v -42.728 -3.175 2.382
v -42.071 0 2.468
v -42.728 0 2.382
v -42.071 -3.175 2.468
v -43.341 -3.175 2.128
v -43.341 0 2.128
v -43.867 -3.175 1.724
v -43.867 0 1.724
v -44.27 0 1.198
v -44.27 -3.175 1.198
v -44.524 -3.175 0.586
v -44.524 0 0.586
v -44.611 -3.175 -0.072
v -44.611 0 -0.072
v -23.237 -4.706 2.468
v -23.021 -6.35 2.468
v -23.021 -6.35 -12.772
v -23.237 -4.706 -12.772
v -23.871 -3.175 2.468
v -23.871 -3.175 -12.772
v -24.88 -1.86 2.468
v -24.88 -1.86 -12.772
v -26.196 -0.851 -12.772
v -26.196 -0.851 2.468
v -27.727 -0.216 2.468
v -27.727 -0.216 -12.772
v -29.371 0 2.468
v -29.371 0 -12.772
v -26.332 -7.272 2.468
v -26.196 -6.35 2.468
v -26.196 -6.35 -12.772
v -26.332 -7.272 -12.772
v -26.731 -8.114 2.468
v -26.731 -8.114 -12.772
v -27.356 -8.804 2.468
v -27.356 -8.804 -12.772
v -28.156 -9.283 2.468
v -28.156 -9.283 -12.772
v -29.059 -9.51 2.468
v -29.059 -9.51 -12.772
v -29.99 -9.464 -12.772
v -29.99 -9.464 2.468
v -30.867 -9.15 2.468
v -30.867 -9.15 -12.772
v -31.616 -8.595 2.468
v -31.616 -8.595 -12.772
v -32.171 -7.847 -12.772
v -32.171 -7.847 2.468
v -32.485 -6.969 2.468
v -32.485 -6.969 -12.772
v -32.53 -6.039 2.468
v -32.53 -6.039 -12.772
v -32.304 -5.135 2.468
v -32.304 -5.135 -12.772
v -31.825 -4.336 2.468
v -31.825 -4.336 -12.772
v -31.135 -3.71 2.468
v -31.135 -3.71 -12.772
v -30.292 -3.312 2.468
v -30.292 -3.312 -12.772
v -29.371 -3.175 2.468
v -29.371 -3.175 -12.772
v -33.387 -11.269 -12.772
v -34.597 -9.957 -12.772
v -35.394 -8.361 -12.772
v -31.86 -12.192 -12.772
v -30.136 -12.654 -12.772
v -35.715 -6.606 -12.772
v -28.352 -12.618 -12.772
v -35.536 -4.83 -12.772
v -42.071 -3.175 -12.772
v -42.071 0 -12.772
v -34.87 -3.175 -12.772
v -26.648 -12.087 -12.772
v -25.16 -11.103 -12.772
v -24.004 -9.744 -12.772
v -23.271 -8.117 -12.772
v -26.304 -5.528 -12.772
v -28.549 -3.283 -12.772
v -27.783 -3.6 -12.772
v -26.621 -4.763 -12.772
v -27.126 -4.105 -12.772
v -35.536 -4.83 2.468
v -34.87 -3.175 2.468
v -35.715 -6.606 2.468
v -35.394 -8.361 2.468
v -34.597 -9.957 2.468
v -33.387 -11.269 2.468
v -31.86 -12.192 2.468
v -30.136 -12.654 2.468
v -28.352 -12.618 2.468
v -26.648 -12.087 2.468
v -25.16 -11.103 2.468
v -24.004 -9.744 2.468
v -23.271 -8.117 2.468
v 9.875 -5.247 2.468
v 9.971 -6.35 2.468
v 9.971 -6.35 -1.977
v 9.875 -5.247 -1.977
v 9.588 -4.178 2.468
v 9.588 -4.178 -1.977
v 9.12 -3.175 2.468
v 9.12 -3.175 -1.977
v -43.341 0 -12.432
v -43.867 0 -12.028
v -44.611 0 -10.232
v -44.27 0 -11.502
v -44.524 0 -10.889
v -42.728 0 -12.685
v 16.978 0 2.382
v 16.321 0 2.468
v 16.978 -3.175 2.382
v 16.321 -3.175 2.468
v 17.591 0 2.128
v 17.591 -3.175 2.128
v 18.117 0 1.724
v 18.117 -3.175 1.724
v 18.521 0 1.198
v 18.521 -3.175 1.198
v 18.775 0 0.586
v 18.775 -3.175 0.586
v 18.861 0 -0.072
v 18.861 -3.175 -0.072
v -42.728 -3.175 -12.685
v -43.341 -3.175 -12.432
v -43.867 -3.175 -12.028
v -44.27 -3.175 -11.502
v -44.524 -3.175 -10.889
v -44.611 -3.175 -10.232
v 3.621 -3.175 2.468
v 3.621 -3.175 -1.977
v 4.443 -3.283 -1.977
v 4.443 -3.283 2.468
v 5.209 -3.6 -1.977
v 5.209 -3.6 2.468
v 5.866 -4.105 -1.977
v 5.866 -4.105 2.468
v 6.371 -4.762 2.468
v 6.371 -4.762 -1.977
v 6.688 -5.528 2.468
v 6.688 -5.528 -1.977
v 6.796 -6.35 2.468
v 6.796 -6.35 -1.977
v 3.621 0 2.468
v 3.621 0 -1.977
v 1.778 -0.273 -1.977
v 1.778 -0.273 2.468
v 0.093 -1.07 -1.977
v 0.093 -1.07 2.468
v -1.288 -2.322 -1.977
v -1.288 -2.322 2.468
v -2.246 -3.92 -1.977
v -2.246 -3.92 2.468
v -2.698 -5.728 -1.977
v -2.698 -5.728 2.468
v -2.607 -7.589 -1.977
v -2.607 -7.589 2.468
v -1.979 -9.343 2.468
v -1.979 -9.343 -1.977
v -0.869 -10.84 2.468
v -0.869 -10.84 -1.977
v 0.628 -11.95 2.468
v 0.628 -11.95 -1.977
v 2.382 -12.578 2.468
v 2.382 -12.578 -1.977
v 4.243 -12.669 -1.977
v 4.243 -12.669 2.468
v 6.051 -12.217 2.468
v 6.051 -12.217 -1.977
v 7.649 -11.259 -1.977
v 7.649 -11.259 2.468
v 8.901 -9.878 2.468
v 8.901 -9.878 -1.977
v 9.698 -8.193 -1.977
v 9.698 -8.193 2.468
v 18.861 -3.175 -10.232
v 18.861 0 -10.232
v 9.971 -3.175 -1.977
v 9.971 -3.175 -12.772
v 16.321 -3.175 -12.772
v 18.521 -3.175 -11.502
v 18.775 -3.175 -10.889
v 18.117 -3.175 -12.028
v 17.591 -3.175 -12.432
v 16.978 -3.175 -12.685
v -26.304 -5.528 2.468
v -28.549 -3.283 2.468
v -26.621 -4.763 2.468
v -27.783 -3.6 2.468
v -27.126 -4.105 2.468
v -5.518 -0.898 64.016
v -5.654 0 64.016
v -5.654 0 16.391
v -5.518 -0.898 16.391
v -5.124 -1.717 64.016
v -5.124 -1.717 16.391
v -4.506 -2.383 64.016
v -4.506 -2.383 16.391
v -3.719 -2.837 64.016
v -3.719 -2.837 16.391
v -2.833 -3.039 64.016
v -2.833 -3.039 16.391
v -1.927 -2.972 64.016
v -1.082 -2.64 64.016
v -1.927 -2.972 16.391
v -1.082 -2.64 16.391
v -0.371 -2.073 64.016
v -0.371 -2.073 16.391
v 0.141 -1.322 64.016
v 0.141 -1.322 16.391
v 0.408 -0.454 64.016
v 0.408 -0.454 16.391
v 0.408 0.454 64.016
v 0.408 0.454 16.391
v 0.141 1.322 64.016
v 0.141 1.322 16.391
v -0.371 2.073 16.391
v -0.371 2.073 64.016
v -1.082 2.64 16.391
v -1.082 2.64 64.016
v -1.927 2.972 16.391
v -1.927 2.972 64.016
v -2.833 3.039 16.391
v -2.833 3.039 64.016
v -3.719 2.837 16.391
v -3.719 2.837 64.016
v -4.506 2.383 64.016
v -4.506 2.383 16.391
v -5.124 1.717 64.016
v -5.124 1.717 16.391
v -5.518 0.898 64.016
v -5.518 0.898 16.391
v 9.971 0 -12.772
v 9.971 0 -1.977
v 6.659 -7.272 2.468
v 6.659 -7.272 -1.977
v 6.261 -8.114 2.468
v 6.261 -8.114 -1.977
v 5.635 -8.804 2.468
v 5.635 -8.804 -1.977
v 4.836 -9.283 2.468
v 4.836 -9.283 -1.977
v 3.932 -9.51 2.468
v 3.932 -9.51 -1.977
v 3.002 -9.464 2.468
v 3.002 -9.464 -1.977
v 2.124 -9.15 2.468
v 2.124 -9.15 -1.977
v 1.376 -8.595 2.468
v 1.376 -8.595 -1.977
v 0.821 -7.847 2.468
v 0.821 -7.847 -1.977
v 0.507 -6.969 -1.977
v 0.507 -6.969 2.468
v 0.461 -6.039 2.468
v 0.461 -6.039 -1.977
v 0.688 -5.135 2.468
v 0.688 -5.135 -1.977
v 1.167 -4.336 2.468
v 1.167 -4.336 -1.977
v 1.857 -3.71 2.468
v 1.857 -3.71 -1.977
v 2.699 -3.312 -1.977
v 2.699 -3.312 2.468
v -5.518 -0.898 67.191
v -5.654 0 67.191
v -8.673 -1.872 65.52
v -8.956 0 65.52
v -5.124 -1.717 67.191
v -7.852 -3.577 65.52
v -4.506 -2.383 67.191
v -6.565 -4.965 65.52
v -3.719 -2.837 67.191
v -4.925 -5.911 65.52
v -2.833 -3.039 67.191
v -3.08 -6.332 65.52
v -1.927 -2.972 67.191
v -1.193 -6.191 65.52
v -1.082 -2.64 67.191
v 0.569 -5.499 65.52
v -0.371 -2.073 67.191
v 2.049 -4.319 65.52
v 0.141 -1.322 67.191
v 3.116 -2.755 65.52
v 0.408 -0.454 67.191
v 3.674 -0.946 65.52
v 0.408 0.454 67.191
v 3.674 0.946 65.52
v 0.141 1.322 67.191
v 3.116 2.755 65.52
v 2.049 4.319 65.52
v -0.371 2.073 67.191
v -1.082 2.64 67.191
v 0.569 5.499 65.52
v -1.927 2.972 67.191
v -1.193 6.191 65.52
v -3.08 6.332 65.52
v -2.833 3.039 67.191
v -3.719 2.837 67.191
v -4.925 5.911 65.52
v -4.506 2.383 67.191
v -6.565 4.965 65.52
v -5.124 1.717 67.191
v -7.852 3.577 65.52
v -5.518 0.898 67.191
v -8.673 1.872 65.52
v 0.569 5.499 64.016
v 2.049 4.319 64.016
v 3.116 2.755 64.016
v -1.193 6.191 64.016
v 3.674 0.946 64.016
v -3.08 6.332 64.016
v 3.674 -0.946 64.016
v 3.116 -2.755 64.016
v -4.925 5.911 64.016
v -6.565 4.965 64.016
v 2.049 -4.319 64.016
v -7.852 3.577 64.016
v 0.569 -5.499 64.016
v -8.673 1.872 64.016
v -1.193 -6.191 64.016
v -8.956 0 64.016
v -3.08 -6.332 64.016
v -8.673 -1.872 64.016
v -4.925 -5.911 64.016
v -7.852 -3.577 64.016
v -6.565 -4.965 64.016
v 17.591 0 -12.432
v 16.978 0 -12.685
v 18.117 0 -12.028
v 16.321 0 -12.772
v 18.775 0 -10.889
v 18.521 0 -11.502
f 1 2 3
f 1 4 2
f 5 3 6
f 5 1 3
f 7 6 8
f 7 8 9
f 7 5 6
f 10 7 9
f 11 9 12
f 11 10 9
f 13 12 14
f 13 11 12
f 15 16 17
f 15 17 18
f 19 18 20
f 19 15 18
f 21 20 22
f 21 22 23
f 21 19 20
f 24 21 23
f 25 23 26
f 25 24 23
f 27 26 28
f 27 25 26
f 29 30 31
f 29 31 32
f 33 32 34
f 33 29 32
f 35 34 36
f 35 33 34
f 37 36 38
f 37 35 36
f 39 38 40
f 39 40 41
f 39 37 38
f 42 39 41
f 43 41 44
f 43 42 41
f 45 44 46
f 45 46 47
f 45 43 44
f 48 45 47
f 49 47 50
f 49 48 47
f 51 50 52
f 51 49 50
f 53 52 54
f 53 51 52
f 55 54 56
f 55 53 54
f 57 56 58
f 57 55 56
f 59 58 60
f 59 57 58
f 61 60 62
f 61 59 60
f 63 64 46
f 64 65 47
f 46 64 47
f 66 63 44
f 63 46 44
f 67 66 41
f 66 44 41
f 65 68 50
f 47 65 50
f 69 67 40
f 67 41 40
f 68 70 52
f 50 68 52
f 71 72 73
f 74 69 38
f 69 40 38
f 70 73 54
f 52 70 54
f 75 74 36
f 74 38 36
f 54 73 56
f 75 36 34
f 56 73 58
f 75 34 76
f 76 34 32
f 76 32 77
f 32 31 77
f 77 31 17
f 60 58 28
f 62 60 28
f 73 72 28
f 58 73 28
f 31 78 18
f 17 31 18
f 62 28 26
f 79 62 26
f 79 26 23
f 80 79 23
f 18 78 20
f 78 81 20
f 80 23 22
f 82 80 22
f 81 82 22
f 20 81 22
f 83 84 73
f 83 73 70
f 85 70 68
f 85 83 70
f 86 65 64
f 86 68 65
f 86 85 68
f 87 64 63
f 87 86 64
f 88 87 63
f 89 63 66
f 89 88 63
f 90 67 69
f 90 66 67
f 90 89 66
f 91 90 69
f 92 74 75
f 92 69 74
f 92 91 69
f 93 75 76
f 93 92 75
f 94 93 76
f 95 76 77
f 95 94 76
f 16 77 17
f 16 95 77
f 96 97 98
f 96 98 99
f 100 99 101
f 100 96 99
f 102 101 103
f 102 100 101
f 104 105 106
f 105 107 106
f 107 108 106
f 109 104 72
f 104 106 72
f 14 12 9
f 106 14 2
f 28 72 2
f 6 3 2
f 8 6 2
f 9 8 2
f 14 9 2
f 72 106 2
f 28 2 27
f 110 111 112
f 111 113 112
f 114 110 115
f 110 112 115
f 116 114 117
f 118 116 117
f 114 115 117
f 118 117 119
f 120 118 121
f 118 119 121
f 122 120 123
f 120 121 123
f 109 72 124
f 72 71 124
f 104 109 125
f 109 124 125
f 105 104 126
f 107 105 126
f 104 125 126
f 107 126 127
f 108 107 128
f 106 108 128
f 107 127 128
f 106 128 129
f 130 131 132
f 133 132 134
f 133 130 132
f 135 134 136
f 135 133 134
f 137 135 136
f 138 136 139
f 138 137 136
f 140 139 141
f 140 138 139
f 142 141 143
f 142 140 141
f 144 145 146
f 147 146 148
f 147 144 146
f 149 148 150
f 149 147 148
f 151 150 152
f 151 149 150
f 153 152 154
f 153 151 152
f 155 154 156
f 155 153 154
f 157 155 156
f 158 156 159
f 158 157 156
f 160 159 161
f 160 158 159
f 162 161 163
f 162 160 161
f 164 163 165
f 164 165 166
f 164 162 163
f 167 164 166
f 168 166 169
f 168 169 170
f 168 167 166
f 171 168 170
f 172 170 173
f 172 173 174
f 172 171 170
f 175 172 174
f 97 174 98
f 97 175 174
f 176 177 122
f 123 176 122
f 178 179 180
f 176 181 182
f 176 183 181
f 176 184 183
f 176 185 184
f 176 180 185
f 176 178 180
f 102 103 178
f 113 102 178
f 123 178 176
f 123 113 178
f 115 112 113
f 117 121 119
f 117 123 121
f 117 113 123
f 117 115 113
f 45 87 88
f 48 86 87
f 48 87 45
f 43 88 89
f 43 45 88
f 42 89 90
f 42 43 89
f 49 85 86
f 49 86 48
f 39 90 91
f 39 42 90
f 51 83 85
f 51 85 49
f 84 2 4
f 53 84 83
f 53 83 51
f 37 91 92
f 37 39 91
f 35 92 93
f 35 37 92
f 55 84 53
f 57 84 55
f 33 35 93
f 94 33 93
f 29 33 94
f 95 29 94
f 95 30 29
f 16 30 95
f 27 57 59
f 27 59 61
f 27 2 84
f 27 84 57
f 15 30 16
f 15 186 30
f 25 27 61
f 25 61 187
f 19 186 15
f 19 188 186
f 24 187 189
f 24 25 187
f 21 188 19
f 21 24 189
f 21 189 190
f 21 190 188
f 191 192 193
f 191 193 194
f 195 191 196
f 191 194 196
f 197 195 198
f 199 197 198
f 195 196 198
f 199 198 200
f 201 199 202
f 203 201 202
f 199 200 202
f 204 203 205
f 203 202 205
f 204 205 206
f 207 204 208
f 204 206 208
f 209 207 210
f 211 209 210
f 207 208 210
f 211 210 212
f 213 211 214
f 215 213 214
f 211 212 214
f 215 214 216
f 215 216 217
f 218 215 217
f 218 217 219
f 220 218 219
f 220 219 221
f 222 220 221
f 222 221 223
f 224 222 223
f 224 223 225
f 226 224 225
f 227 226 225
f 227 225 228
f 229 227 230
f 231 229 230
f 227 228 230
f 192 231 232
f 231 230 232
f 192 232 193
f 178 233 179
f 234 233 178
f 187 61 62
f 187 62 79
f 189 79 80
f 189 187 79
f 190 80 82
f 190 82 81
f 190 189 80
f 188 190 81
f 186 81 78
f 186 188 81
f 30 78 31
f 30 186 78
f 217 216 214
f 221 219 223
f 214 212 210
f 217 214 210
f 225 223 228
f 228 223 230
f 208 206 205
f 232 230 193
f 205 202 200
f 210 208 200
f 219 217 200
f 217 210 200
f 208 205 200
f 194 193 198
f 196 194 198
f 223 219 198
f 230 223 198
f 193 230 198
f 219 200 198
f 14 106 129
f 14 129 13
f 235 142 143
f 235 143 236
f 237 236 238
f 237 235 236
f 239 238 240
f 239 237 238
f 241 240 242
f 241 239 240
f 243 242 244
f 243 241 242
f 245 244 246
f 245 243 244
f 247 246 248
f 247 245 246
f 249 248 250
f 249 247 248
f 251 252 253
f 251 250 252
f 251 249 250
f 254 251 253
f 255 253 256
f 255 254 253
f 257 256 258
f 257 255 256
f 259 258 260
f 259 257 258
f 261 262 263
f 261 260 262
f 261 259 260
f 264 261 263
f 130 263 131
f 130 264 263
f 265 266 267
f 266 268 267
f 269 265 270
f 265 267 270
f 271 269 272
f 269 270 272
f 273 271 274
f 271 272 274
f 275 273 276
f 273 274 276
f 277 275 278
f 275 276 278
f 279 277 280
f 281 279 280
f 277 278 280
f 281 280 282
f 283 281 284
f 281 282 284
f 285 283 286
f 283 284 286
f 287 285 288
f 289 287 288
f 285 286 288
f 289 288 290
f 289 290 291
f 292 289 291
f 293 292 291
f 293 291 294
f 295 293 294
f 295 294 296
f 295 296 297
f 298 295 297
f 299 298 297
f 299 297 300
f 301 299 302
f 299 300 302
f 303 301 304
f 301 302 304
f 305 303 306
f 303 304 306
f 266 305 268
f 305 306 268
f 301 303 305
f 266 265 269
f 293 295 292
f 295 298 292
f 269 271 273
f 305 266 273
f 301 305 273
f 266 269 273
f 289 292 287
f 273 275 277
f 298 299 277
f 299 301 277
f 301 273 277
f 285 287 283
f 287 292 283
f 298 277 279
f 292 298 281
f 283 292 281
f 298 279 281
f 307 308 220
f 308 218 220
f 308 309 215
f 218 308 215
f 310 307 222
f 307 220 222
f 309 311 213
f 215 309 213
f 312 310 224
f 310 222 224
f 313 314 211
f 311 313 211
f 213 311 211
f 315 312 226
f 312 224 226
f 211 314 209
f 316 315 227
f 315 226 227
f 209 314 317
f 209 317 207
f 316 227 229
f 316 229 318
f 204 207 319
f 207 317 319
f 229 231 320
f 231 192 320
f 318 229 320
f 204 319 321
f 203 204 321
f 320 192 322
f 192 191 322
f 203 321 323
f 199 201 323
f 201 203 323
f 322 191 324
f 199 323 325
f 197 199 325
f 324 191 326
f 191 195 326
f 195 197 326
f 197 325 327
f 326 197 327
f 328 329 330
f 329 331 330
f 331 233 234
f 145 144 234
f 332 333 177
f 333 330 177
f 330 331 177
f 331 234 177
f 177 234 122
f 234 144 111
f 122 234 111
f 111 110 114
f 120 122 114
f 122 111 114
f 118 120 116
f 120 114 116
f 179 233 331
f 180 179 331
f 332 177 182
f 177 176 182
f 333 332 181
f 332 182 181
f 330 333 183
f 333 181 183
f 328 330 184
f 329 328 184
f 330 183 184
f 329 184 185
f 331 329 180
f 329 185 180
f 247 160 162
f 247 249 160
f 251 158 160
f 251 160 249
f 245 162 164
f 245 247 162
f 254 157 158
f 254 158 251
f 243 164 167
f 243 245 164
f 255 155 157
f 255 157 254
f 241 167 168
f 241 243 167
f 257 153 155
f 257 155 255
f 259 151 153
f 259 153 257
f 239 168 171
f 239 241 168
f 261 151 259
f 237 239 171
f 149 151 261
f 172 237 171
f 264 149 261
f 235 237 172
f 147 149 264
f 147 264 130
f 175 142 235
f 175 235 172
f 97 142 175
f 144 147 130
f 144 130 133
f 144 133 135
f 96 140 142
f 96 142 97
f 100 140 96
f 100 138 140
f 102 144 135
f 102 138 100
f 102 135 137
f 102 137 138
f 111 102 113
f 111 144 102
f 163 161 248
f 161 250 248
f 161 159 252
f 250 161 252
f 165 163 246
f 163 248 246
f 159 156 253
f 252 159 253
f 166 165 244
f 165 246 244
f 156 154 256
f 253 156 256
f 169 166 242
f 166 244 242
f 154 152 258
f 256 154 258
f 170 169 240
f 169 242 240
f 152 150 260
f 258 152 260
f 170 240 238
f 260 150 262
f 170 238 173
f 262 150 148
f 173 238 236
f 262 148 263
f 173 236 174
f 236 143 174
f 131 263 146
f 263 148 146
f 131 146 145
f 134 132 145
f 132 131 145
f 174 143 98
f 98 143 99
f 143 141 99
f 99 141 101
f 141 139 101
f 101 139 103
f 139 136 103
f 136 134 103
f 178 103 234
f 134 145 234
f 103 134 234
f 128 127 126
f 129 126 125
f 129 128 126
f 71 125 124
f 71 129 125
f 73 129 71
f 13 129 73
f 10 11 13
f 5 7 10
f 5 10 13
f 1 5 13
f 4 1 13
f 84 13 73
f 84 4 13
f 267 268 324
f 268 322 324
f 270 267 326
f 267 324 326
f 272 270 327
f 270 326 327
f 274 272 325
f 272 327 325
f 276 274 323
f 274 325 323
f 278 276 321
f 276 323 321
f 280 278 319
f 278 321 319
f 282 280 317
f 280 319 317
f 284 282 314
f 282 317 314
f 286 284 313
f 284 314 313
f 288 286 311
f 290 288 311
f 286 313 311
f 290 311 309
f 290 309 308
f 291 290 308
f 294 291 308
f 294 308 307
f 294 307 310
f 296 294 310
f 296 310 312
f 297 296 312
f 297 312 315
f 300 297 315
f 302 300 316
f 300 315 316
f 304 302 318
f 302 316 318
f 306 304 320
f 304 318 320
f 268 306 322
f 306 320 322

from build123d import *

# Parameters (mm, degrees)
F0_W      = 15.24
F0_H      = 15.24
F1_DEPTH  = 3.175
F3_DEPTH  = 15.24
F5_R      = 2.54
F6_W      = 6.35
F6_H      = 15.24
F7_DEPTH  = 25.4
F8_W      = 15.24
F8_H      = 15.24
F9_DEPTH  = 3.175
F11_DEPTH = 15.24
F12_W     = 12.7
F12_H     = 8.89
F12_W_2   = 6.35
F12_H_2   = 10.795
F13_DEPTH = 25.4
F19_R     = 2.54


# Not quite as in the source:
# - a feature of the source that left no trace in its solid (it failed there, or was rolled back) is left out


with BuildPart() as f1:
    # F0 (on Front) → F1 (new body)
    with BuildSketch(Plane.XZ):
        with Locations((-36.9905814096, -5.1518018644)):
            Rectangle(F0_W, F0_H)
    extrude(amount=F1_DEPTH)

    # F2 (on face) → F3 (join, through all)
    with BuildSketch(Plane.XY.offset(2.4681981356)):
        with BuildLine():
            ThreePointArc((-34.8698427237, -3.175), (-31.014082346, -12.4836289969), (-23.0205814096, -6.35))
            ThreePointArc((-23.0205814096, -6.35), (-24.8804533491, -1.8598719395), (-29.3705814096, 0))
            Line((-29.3705814096, 0), (-29.3705814096, -3.175))
            Line((-29.3705814096, -3.175), (-34.8698427237, -3.175))
        make_face()
        with BuildLine():
            ThreePointArc((-26.1955814096, -6.35), (-31.6156454399, -8.5950640303), (-29.3705814096, -3.175))
            ThreePointArc((-29.3705814096, -3.175), (-27.1255173794, -4.1049359697), (-26.1955814096, -6.35))
        make_face(mode=Mode.SUBTRACT)
        with BuildLine():
            Line((-29.3705814096, -3.175), (-29.3705814096, 0))
            ThreePointArc((-29.3705814096, 0), (-32.5455814096, -0.850738686), (-34.8698427237, -3.175))
            Line((-34.8698427237, -3.175), (-29.3705814096, -3.175))
        make_face()
    extrude(amount=-F3_DEPTH)

    # F5
    f5_edges = [f1.edges().sort_by_distance(p)[0] for p in [
        (-44.610581, -1.5875, 2.468198),
        (-44.610581, -1.5875, -12.771802),
    ]]
    fillet(f5_edges, radius=F5_R)

    # F6 (on face) → F7 (cut)
    with BuildSketch(Plane.XZ):
        with Locations((-32.5455814096, -20.3918018644)):
            Rectangle(F6_W, F6_H)
        with Locations((-26.1955814096, -20.3918018644)):
            Rectangle(F6_W, F6_H)
        Polygon((-35.7205814096, 27.8681981356), (-35.7205814096, 17.7081981356), (-29.3705814096, 17.7081981356), (-29.3705814096, 20.251745157), (-32.0902006372, 27.8681981356), align=None)
        Polygon((-28.4623529462, 17.7081981356), (-23.0205814096, 17.7081981356), (-23.0205814096, 27.8681981356), (-29.3705814096, 27.8681981356), (-29.3705814096, 20.251745157), align=None)
    extrude(amount=F7_DEPTH, mode=Mode.SUBTRACT)


with BuildPart() as f9:
    # F8 (on Front) → F9 (new body)
    with BuildSketch(Plane.XZ):
        with Locations((11.2410542523, -5.1518018644)):
            Rectangle(F8_W, F8_H)
    extrude(amount=F9_DEPTH)

    # F10 (on face) → F11 (join, through all)
    with BuildSketch(Plane.XY.offset(2.4681981356)):
        with BuildLine():
            Line((3.6210542523, -3.175), (3.6210542523, 0))
            ThreePointArc((3.6210542523, 0), (-0.8690738082, -10.8401280605), (9.9710542523, -6.35))
            ThreePointArc((9.9710542523, -6.35), (9.7546832493, -4.7064990636), (9.1203155664, -3.175))
            Line((9.1203155664, -3.175), (3.6210542523, -3.175))
        make_face()
        with BuildLine():
            ThreePointArc((6.7960542523, -6.35), (1.3759902221, -8.5950640303), (3.6210542523, -3.175))
            ThreePointArc((3.6210542523, -3.175), (5.8661182826, -4.1049359697), (6.7960542523, -6.35))
        make_face(mode=Mode.SUBTRACT)
    extrude(amount=-F11_DEPTH)

    # F12 (on face) → F13 (cut)
    with BuildSketch(Plane(origin=(0, 0, 0), x_dir=(-1, 0, 0), z_dir=(0, 1, 0))):
        Polygon((2.7289457477, 18.3431981356), (-9.9710542523, 18.3431981356), (-9.9710542523, 2.4681981356), (-3.6210542523, 2.4681981356), (2.7289457477, 2.4681981356), align=None)
        with Locations((-3.6210542523, 22.7881981356)):
            Rectangle(F12_W, F12_H)
        with Locations((-0.4460542523, -7.3743018644)):
            Rectangle(F12_W_2, F12_H_2)
        with Locations((-6.7960542523, -7.3743018644)):
            Rectangle(F12_W_2, F12_H_2)
    extrude(amount=-F13_DEPTH, mode=Mode.SUBTRACT)

    # F19
    f19_edges = [f9.edges().sort_by_distance(p)[0] for p in [
        (18.861054, -1.5875, 2.468198),
        (18.861054, -1.5875, -12.771802),
    ]]
    fillet(f19_edges, radius=F19_R)


with BuildPart() as f15:
    # F14 (on Front) → F15 (revolve)
    with BuildSketch(Plane.XZ):
        Polygon((-8.9555652812, 64.0162163931), (-5.6535652812, 64.0162163931), (-5.6535652812, 16.3912163931), (-2.6055652812, 16.3912163931), (-2.6055652812, 67.1912163931), (-5.6535652812, 67.1912163931), (-8.9555652812, 65.5202418566), align=None)
    revolve(axis=Axis((-2.6055652812, 0, 41.7912163931), (0, 0, 1)))


solid = Compound([f1.part, f9.part, f15.part])
